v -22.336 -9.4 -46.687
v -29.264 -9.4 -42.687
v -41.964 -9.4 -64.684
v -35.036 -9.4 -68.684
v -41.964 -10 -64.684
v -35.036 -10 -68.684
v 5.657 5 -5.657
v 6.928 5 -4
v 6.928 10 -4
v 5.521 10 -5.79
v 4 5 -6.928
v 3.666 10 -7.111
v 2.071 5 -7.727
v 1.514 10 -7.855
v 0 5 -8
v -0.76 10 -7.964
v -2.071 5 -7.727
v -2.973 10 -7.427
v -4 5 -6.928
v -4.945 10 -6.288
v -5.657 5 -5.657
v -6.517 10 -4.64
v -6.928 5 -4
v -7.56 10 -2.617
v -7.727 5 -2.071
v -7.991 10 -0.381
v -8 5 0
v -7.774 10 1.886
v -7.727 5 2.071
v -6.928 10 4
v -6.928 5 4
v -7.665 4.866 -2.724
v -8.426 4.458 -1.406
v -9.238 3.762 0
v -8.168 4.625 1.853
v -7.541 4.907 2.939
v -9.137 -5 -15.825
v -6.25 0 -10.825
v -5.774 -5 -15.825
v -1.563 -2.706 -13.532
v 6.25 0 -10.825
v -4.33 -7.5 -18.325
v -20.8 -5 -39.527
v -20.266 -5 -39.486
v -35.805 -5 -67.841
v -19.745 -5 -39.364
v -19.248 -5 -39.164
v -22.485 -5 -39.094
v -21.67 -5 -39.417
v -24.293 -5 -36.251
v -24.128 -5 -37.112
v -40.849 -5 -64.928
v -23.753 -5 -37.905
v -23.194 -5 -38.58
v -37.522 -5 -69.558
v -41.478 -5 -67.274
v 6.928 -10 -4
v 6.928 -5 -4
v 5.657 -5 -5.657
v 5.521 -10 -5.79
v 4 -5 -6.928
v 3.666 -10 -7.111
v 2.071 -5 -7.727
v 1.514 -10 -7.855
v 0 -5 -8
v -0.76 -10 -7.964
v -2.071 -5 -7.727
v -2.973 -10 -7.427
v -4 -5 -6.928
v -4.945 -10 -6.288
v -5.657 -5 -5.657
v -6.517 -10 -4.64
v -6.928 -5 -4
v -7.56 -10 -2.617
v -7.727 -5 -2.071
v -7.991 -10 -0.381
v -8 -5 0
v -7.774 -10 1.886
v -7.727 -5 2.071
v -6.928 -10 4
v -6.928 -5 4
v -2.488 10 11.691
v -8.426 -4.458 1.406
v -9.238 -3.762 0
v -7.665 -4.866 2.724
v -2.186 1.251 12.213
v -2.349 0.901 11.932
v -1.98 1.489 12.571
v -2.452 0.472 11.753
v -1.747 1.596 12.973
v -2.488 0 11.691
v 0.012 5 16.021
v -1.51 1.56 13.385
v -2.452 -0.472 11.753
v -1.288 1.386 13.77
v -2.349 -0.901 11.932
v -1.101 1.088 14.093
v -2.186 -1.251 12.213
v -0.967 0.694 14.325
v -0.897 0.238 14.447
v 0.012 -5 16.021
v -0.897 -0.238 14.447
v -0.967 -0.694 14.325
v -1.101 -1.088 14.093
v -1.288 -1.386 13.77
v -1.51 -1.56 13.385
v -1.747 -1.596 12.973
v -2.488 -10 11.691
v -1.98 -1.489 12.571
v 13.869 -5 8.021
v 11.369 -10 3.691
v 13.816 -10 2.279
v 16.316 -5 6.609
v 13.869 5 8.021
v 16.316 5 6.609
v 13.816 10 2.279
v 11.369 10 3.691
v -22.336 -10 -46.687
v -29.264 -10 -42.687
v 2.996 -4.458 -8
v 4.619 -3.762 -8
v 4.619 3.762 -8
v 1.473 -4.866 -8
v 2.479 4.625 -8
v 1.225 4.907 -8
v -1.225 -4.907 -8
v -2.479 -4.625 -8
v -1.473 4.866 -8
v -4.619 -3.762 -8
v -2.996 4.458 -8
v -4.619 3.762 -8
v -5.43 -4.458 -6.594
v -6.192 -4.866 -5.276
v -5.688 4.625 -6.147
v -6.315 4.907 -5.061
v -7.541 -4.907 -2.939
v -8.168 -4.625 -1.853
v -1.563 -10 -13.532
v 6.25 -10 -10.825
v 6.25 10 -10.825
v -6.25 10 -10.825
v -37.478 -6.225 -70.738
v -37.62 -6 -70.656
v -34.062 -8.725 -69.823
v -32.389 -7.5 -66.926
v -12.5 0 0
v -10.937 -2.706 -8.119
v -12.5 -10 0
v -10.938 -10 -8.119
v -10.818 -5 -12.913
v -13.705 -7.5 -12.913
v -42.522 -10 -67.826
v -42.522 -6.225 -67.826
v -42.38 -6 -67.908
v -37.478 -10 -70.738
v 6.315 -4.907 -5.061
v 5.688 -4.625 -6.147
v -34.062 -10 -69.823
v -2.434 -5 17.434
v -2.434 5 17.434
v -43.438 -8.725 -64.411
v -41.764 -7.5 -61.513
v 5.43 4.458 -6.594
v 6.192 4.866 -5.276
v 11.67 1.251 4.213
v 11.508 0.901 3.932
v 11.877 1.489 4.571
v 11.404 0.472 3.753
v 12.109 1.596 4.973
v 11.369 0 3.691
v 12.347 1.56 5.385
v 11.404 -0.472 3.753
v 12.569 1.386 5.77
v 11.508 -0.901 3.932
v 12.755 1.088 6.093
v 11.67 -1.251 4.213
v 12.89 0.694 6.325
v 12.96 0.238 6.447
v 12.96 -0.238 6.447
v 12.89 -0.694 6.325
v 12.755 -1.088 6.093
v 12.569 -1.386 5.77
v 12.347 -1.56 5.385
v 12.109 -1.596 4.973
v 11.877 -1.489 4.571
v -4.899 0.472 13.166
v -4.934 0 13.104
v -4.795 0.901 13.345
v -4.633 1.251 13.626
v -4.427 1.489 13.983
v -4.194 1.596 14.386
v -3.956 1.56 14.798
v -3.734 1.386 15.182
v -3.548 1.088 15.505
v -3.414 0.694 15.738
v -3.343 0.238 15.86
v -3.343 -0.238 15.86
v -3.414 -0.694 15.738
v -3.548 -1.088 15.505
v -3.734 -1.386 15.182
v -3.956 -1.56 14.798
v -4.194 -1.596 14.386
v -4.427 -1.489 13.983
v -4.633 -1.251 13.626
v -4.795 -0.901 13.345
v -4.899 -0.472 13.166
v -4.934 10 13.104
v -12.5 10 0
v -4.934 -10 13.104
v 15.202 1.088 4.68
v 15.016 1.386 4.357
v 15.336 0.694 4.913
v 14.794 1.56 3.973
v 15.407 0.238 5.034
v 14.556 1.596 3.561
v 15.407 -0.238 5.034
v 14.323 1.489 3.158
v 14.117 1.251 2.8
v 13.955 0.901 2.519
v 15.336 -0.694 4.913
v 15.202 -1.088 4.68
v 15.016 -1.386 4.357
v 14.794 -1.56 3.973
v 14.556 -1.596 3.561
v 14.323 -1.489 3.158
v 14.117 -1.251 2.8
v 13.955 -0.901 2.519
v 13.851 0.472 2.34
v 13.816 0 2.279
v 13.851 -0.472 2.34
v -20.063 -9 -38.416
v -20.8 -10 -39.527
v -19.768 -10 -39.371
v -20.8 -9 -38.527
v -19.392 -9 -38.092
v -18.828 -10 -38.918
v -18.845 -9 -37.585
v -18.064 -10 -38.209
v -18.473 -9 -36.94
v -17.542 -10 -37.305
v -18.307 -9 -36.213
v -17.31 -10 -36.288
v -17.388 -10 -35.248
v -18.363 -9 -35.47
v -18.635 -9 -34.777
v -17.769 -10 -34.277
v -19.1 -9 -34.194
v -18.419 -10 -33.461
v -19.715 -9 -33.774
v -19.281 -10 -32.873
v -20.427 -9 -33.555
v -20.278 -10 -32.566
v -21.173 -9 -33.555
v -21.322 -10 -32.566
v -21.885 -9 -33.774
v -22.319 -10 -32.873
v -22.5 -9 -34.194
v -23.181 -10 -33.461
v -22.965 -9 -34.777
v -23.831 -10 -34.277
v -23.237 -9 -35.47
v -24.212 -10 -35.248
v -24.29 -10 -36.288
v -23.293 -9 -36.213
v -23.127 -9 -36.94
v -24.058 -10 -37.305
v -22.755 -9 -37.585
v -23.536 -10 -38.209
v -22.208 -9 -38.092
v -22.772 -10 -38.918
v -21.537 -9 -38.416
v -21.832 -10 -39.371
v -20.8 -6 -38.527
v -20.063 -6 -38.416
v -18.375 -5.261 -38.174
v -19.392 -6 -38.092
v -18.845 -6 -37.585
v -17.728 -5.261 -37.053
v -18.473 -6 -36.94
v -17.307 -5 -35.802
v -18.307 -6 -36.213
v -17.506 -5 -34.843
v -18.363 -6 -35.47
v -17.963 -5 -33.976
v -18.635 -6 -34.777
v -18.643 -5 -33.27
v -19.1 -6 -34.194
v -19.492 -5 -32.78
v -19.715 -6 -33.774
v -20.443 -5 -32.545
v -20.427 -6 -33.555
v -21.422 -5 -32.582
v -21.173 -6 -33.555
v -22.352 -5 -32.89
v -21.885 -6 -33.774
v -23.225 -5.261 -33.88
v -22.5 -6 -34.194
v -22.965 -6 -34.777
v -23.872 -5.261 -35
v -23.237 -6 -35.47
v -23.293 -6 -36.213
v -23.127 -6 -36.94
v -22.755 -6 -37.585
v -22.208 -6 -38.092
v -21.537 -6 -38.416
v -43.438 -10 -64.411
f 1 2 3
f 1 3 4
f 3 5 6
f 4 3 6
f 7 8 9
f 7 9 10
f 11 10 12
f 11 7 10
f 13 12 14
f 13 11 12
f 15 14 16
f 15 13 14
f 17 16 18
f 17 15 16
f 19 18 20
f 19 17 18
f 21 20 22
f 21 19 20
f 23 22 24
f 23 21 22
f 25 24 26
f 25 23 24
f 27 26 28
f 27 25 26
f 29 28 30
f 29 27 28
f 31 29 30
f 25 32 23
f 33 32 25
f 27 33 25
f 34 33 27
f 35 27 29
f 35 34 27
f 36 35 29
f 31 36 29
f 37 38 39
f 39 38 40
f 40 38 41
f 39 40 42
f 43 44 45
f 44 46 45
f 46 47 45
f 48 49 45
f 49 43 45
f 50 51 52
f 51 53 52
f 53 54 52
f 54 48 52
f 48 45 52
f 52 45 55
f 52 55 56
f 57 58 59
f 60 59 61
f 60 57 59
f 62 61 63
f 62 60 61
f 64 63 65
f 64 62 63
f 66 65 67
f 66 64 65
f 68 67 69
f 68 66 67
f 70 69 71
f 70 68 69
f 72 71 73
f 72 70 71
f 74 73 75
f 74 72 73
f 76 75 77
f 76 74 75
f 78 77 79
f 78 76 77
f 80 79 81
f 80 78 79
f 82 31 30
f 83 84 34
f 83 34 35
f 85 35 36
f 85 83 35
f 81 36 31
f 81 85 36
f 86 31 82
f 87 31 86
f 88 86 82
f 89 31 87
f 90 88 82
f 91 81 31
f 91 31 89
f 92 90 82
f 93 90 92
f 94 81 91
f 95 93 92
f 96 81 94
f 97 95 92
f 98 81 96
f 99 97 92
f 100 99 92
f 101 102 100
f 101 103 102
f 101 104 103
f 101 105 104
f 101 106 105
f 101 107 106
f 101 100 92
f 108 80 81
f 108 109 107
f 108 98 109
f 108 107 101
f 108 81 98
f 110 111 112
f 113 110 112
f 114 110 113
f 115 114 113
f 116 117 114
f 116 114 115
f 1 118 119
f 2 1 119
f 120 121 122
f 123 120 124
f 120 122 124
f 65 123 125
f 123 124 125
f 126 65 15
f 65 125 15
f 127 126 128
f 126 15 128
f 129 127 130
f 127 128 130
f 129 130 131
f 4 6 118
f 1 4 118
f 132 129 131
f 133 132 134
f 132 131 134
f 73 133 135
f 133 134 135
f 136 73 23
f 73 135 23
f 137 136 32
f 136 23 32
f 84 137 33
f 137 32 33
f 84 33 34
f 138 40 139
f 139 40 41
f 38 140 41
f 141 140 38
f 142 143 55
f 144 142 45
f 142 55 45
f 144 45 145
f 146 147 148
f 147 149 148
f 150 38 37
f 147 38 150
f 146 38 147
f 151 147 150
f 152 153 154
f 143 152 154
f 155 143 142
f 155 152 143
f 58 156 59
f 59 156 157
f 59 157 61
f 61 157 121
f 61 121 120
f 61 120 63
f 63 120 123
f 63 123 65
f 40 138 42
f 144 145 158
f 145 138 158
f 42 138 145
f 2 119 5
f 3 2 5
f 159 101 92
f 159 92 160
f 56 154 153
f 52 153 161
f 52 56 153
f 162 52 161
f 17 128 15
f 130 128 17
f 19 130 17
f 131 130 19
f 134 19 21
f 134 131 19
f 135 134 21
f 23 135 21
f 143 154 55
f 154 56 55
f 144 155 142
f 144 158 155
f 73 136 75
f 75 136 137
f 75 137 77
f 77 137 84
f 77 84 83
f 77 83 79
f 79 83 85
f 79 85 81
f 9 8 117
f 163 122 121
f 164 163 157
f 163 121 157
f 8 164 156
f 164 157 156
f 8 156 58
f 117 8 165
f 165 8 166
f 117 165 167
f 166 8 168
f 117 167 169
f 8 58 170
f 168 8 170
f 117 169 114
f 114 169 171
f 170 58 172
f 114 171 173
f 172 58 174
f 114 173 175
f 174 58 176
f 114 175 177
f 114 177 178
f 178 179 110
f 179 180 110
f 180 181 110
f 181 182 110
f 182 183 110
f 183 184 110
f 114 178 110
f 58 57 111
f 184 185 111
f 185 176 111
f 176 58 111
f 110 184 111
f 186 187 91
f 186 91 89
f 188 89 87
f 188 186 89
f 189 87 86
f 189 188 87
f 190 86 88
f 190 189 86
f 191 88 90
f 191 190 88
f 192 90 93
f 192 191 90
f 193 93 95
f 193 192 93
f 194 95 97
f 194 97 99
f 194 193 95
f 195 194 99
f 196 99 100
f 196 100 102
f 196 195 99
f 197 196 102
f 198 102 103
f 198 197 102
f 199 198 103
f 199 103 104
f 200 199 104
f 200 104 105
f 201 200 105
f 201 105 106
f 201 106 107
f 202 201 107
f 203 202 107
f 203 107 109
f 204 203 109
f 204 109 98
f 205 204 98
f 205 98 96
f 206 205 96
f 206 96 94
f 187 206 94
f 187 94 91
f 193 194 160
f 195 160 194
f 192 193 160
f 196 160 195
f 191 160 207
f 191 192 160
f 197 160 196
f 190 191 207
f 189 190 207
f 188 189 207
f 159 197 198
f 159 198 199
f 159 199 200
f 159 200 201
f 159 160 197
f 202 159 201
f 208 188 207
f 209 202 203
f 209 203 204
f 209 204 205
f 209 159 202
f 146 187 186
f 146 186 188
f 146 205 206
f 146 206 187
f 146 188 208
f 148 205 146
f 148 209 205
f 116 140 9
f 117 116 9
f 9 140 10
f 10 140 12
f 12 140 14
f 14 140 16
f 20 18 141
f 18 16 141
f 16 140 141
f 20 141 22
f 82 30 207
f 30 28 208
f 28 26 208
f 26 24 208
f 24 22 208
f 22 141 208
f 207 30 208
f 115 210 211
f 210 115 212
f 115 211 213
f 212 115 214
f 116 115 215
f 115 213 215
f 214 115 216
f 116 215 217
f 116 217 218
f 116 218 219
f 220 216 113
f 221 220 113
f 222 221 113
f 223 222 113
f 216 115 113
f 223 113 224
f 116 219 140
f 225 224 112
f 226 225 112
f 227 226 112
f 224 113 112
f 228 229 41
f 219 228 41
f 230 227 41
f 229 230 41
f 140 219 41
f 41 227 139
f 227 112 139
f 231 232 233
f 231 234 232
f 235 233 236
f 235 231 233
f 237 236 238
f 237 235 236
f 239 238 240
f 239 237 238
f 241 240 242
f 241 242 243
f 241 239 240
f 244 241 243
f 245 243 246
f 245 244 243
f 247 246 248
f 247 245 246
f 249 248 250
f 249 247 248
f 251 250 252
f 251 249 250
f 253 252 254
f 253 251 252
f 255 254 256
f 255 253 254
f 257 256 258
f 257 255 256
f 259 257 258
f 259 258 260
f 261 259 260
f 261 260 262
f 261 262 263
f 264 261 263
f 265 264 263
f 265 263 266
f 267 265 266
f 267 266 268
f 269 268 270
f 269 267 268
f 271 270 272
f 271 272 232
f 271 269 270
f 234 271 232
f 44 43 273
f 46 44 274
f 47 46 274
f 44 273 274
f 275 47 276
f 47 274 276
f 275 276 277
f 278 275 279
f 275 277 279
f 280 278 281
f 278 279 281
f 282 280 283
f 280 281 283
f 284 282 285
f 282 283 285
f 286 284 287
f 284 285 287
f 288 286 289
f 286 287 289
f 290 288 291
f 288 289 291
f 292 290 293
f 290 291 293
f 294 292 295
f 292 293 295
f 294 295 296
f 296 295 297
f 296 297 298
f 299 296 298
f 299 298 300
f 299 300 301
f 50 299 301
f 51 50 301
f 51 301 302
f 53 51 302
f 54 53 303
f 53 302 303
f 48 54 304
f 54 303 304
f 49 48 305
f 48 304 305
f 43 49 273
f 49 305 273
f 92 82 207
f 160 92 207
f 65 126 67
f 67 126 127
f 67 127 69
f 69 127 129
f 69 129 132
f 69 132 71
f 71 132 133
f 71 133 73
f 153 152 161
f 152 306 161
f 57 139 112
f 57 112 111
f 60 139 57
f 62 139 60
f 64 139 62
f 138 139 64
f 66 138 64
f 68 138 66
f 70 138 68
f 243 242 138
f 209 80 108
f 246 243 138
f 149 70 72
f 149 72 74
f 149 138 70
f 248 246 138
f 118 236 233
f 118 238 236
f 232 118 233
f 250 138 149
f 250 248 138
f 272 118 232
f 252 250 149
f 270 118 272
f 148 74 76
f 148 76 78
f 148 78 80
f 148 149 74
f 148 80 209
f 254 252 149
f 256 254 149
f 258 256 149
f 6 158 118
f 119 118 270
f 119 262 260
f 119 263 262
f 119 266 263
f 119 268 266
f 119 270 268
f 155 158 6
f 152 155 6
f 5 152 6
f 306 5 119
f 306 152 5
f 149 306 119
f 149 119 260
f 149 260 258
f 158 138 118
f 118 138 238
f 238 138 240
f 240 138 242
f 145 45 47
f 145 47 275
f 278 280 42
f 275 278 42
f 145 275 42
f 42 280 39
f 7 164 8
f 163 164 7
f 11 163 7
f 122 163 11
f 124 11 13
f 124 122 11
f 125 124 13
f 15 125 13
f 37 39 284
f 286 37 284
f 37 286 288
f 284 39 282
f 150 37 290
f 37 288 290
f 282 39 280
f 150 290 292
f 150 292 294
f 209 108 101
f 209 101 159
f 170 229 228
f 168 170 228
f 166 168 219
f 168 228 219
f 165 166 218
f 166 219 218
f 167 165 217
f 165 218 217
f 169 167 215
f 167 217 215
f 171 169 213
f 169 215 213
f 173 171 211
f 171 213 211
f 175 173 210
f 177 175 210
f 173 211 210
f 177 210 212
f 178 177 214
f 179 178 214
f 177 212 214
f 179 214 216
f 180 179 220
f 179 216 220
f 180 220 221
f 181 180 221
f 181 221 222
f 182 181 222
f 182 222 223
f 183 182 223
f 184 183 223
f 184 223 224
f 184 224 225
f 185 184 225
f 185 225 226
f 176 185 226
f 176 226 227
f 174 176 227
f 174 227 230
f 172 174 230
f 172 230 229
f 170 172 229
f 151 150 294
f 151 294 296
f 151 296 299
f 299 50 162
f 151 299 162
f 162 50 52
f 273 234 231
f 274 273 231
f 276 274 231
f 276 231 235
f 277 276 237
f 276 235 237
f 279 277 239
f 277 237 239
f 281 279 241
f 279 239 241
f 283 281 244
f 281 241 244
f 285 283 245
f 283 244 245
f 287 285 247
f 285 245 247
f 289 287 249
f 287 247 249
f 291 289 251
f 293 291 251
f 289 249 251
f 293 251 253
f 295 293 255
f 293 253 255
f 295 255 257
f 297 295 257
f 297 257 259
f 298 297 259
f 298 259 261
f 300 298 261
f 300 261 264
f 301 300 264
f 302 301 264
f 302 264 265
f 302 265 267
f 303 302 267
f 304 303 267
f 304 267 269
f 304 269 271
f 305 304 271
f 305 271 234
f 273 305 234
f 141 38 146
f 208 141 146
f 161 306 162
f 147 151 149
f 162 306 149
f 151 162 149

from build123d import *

# Parameters (mm, degrees)
SKETCH1_R                = 8
BOSS_EXTRUDE1_DEPTH      = 10
SKETCH1_3_R              = 8
CUT_EXTRUDE3_DEPTH       = 5
CUT_EXTRUDE6_DEPTH       = 20.324531042175384
CUT_EXTRUDE6_DEPTH_BACK  = 20.324531042175384
BOSS_EXTRUDE2_DEPTH      = 5
CHAMFER1_SIZE            = 5
CHAMFER2_SIZE            = 2.5
CHAMFER3_SIZE            = 2.5
CHAMFER4_SIZE            = 1
CHAMFER4_EDGE_2_SIZE     = 1
CHAMFER4_EDGE_2_SIZE2    = 2.7320508075695416
CHAMFER4_EDGE_3_SIZE     = 1
CHAMFER4_EDGE_3_SIZE2    = 2.7320508075682537
CUT_EXTRUDE7_DEPTH       = 0.6
SKETCH5_3_R              = 2.499999999999999
CUT_EXTRUDE8_DEPTH       = 86.3857846528101
CHAMFER5_SIZE            = 1
BOSS_EXTRUDE3_DEPTH      = 20
CHAMFER6_SIZE            = 5
CUT_EXTRUDE9_REACH       = 86.597
SKETCH7_R                = 1.6000000000000019
CHAMFER6_OF_MIRROR2_SIZE = 5


with BuildPart() as part:
    # Sketch1 → Boss-Extrude1 (new, symmetric)
    with BuildSketch(Plane(origin=(0, 0, 0), x_dir=(1, 0, 0), z_dir=(0, 1, 0))):
        Polygon((-12.5, 3.33e-15), (-6.249999999999997, -10.825317547305481), (6.249999999999998, -10.825317547305481), (12.499999999999995, 2.3e-15), (6.249999999999995, 10.825317547305485), (-6.249999999999999, 10.825317547305483), align=None)
        with Locations(Location((0, 0, 0), (0, 0, 270))):
            Circle(SKETCH1_R, mode=Mode.SUBTRACT)
    extrude(amount=BOSS_EXTRUDE1_DEPTH, both=True)

    # Sketch1<3> → Cut-Extrude3 (cut, symmetric)
    with BuildSketch(Plane(origin=(0, 0, 0), x_dir=(1, 0, 0), z_dir=(0, 1, 0))):
        with BuildLine():
            Line((9.237604307034013, 3.47e-15), (6.928203158180938, 4.000000124871458))
            ThreePointArc((6.928203158180937, 4.000000124871459), (7.727406591653098, 2.070552430458174), (8, 0))
            ThreePointArc((8, -1.96e-15), (7.727406617827326, -2.070552332774626), (6.92820325931039, -3.999999949710111))
            Line((6.92820325931039, -3.999999949710112), (9.237604307034013, 3.55e-15))
        make_face()
        with BuildLine():
            Line((6.928203158180938, 4.000000124871458), (4.6188021535170005, 7.999999999999998))
            Line((4.6188021535170005, 7.999999999999998), (-9.11633347e-09, 7.999999999999998))
            ThreePointArc((-9.11633386e-09, 8), (3.999999933616783, 6.9282032686018775), (6.928203158180937, 4.000000124871459))
        make_face()
        with BuildLine():
            ThreePointArc((-6.928203259310827, 3.9999999497093532), (-4.000000029092812, 6.928203213478766), (-9.11633386e-09, 8))
            Line((-9.11633347e-09, 7.999999999999998), (-4.618802153517008, 7.999999999999998))
            Line((-4.618802153517007, 7.999999999999998), (-6.928203259310829, 3.999999949709351))
        make_face()
        with BuildLine():
            ThreePointArc((-6.9282031729355795, -4.0000000993156695), (-7.999999999999999, -8.637524731e-08), (-6.928203259310827, 3.9999999497093532))
            Line((-6.928203259310829, 3.999999949709351), (-9.237604307034013, -1.78e-15))
            Line((-9.237604307034013, -1.73e-15), (-6.9282031729355795, -4.0000000993156695))
        make_face()
        with BuildLine():
            ThreePointArc((1.7617e-13, -8), (-3.9999999503420853, -6.928203258945519), (-6.9282031729355795, -4.0000000993156695))
            Line((-6.9282031729355795, -4.0000000993156695), (-4.6188021535170005, -8.000000000000002))
            Line((-4.6188021535170005, -8.000000000000002), (1.7586e-13, -8))
        make_face()
        with BuildLine():
            Line((4.6188021535170085, -7.999999999999998), (6.92820325931039, -3.999999949710112))
            ThreePointArc((6.92820325931039, -3.999999949710111), (4.000000025145024, -6.928203215758023), (1.7617e-13, -8))
            Line((1.7586e-13, -8), (4.618802153517008, -7.999999999999998))
        make_face()
        with Locations(Location((0, 0, 0), (0, 0, 270))):
            Circle(SKETCH1_3_R)
    extrude(amount=CUT_EXTRUDE3_DEPTH, both=True, mode=Mode.SUBTRACT)

    # Sketch2 → Revolve1 (revolve)
    with BuildSketch(Plane(origin=(0, 0, 0), x_dir=(0, 0, -1), z_dir=(1, 0, 0))):
        Polygon((9.239999999999998, 10), (8, 10), (8, 5.000000000000001), (9.24, 3.75999999999999), align=None)
    revolve1 = revolve(axis=Axis((0, 0, 0), (0, 1, 0)))

    # Mirror1: Revolve1 across plane
    add(revolve1.mirror(Plane.ZX))

    # Sketch3 → Cut-Extrude6 (cut, two sides: drawn at the far end of the back side and taken through both)
    with BuildSketch(Plane(origin=(0, 0, 0), x_dir=(1, 0, 0), z_dir=(0, 1, 0)).offset(-CUT_EXTRUDE6_DEPTH_BACK)):
        Polygon((-6.928203230275505, -4.0000000000000036), (6.928203230275509, 4), (13.370436636375942, -7.158275573583455), (-0.48596982417507123, -15.158275573583454), align=None)
    extrude(amount=CUT_EXTRUDE6_DEPTH + CUT_EXTRUDE6_DEPTH_BACK, mode=Mode.SUBTRACT)

    # Sketch4 → Boss-Extrude2 (add)
    with BuildSketch(Plane(origin=(0, -10, 0), x_dir=(-1, 0, 0), z_dir=(0, -1, 0))):
        Polygon((-6.249999999999994, 10.825317547305485), (3.55e-15, 10.825317547305483), (1.5625000000000036, 13.531646934131857), align=None)
        Polygon((1.5625000000000036, 13.531646934131857), (3.47e-15, 10.825317547305483), (6.249999999999999, 10.825317547305483), align=None)
        Polygon((35.31249999999998, 71.98836168958148), (1.5625000000000036, 13.531646934131857), (6.249999999999999, 10.825317547305485), (10.937499999999998, 8.11898816047911), (44.68750000000001, 66.57570291592872), align=None)
        Polygon((10.937499999999998, 8.11898816047911), (6.249999999999999, 10.825317547305485), (9.375, 5.412658773652744), align=None)
        Polygon((10.9375, 8.11898816047912), (9.375, 5.412658773652751), (12.500000000000002, 3.55e-15), align=None)
    extrude(amount=-BOSS_EXTRUDE2_DEPTH)

    # Chamfer1
    # the kernel refuses this chamfer: 5 mm, written as the material it adds along each edge
    with BuildSketch(Plane(origin=(19.108414939829547, -5, -10.825317547305485), x_dir=(0, 1, 3.6e-16), z_dir=(-1, 0, 0))) as chamfer1_piece_1_section:
        Polygon((CHAMFER1_SIZE, 0), (-1.78e-15, CHAMFER1_SIZE), (0, 0), align=None)
    chamfer1_piece_1 = extrude(amount=38.2168298796591, mode=Mode.PRIVATE)
    chamfer1_piece_1 = split(chamfer1_piece_1, bisect_by=Plane(origin=(0.08960373495738594, -5, -21.8058333161051), z_dir=(0.8660254037844386, 0, 0.5000000000000002)), keep=Keep.TOP, mode=Mode.PRIVATE)
    chamfer1_piece_1 = split(chamfer1_piece_1, bisect_by=Plane(origin=(4.777103734957368, -5, -2.551131165332242), z_dir=(-0.8660254037844389, 0, 0.49999999999999956)), keep=Keep.TOP, mode=Mode.PRIVATE)
    add(chamfer1_piece_1)
    with BuildSketch(Plane(origin=(19.108414939829547, -5, -10.825317547305485), x_dir=(0, 1, 3.6e-16), z_dir=(-1, 0, 0))) as chamfer1_piece_2_section:
        Polygon((CHAMFER1_SIZE, 0), (-1.78e-15, CHAMFER1_SIZE), (0, 0), align=None)
    chamfer1_piece_2 = extrude(amount=38.2168298796591, mode=Mode.PRIVATE)
    chamfer1_piece_2 = split(chamfer1_piece_2, bisect_by=Plane(origin=(17.730727624847805, -5, -6.848276836486285), z_dir=(-0.32732683535398893, 0, 0.9449111825230679)), keep=Keep.TOP, mode=Mode.PRIVATE)
    chamfer1_piece_2 = split(chamfer1_piece_2, bisect_by=Plane(origin=(4.777103734957372, -5, -2.5511311653322437), z_dir=(0.8660254037844389, 0, -0.49999999999999956)), keep=Keep.TOP, mode=Mode.PRIVATE)
    add(chamfer1_piece_2)
    with BuildSketch(Plane(origin=(19.108414939829547, -5, -10.825317547305485), x_dir=(0, 1, 3.6e-16), z_dir=(-1, 0, 0))) as chamfer1_piece_3_section:
        Polygon((CHAMFER1_SIZE, 0), (-1.78e-15, CHAMFER1_SIZE), (0, 0), align=None)
    chamfer1_piece_3 = extrude(amount=38.2168298796591, mode=Mode.PRIVATE)
    chamfer1_piece_3 = split(chamfer1_piece_3, bisect_by=Plane(origin=(17.730727624847805, -5, -6.848276836486285), z_dir=(0.32732683535398893, 0, -0.9449111825230679)), keep=Keep.TOP, mode=Mode.PRIVATE)
    chamfer1_piece_3 = split(chamfer1_piece_3, bisect_by=Plane(origin=(4.777103734957368, -5, -2.551131165332242), z_dir=(-0.8660254037844389, 0, 0.49999999999999956)), keep=Keep.TOP, mode=Mode.PRIVATE)
    add(chamfer1_piece_3)
    with BuildSketch(Plane(origin=(-18.929207469914783, -5, 11.135713990293745), x_dir=(1.5e-16, 1, 9e-17), z_dir=(0.5000000000000003, 0, -0.8660254037844386))) as chamfer1_piece_4_section:
        Polygon((CHAMFER1_SIZE, 0), (-8.9e-16, -CHAMFER1_SIZE), (0, 0), align=None)
    chamfer1_piece_4 = extrude(amount=38.216829879659116, mode=Mode.PRIVATE)
    chamfer1_piece_4 = split(chamfer1_piece_4, bisect_by=Plane(origin=(-18.929207469914786, -5, -10.825317547305481), z_dir=(1.4e-16, 0, 1)), keep=Keep.TOP, mode=Mode.PRIVATE)
    chamfer1_piece_4 = split(chamfer1_piece_4, bisect_by=Plane(origin=(-4.597896265042607, -5, 2.8615276083204897), z_dir=(0.8660254037844386, 0, -0.5000000000000002)), keep=Keep.TOP, mode=Mode.PRIVATE)
    add(chamfer1_piece_4)
    with BuildSketch(Plane(origin=(-18.929207469914783, -5, 11.135713990293745), x_dir=(1.5e-16, 1, 9e-17), z_dir=(0.5000000000000003, 0, -0.8660254037844386))) as chamfer1_piece_5_section:
        Polygon((CHAMFER1_SIZE, 0), (-8.9e-16, -CHAMFER1_SIZE), (0, 0), align=None)
    chamfer1_piece_5 = extrude(amount=38.216829879659116, mode=Mode.PRIVATE)
    chamfer1_piece_5 = split(chamfer1_piece_5, bisect_by=Plane(origin=(-14.796145524969571, -5, 11.931122132457586), z_dir=(0.9819805060619656, 0, 0.18898223650461415)), keep=Keep.TOP, mode=Mode.PRIVATE)
    chamfer1_piece_5 = split(chamfer1_piece_5, bisect_by=Plane(origin=(-4.597896265042607, -5, 2.8615276083204897), z_dir=(-0.8660254037844386, 0, 0.5000000000000002)), keep=Keep.TOP, mode=Mode.PRIVATE)
    add(chamfer1_piece_5)
    with BuildSketch(Plane(origin=(-18.929207469914783, -5, 11.135713990293745), x_dir=(1.5e-16, 1, 9e-17), z_dir=(0.5000000000000003, 0, -0.8660254037844386))) as chamfer1_piece_6_section:
        Polygon((CHAMFER1_SIZE, 0), (-8.9e-16, -CHAMFER1_SIZE), (0, 0), align=None)
    chamfer1_piece_6 = extrude(amount=38.216829879659116, mode=Mode.PRIVATE)
    chamfer1_piece_6 = split(chamfer1_piece_6, bisect_by=Plane(origin=(-14.796145524969573, -5, 11.931122132457585), z_dir=(-0.9819805060619656, 0, -0.18898223650461415)), keep=Keep.TOP, mode=Mode.PRIVATE)
    chamfer1_piece_6 = split(chamfer1_piece_6, bisect_by=Plane(origin=(-4.597896265042609, -5, 2.8615276083204915), z_dir=(0.8660254037844386, 0, -0.5000000000000002)), keep=Keep.TOP, mode=Mode.PRIVATE)
    add(chamfer1_piece_6)
    with BuildSketch(Plane(origin=(-18.929207469914783, -5, 11.135713990293745), x_dir=(1.5e-16, 1, 9e-17), z_dir=(0.5000000000000003, 0, -0.8660254037844386))) as chamfer1_piece_7a_section:
        Polygon((CHAMFER1_SIZE, 0), (-8.9e-16, -CHAMFER1_SIZE), (0, 0), align=None)
    chamfer1_piece_7a = extrude(amount=38.216829879659116, mode=Mode.PRIVATE)
    chamfer1_piece_7a = split(chamfer1_piece_7a, bisect_by=Plane(origin=(-14.796145524969571, -5, 11.931122132457586), z_dir=(0.9819805060619656, 0, 0.18898223650461415)), keep=Keep.TOP, mode=Mode.PRIVATE)
    chamfer1_piece_7a = split(chamfer1_piece_7a, bisect_by=Plane(origin=(-18.929207469914786, -5, -10.825317547305477), z_dir=(-1.4e-16, 0, -1)), keep=Keep.TOP, mode=Mode.PRIVATE)
    chamfer1_piece_7a = split(chamfer1_piece_7a, bisect_by=Plane(origin=(4.777103734957382, -5, -2.551131165332224), z_dir=(-0.8660254037844389, 0, 0.49999999999999956)), keep=Keep.TOP, mode=Mode.PRIVATE)
    with BuildSketch(Plane(origin=(19.108414939829547, -5, -10.825317547305485), x_dir=(0, 1, 3.6e-16), z_dir=(-1, 0, 0))) as chamfer1_piece_7b_section:
        Polygon((CHAMFER1_SIZE, 0), (-1.78e-15, CHAMFER1_SIZE), (0, 0), align=None)
    chamfer1_piece_7b = extrude(amount=38.2168298796591, mode=Mode.PRIVATE)
    chamfer1_piece_7b = split(chamfer1_piece_7b, bisect_by=Plane(origin=(0.08960373495739304, -5, -21.8058333161051), z_dir=(-0.8660254037844386, 0, -0.5000000000000002)), keep=Keep.TOP, mode=Mode.PRIVATE)
    chamfer1_piece_7b = split(chamfer1_piece_7b, bisect_by=Plane(origin=(-4.597896265042607, -5, 2.8615276083205003), z_dir=(0.8660254037844386, 0, -0.5000000000000002)), keep=Keep.TOP, mode=Mode.PRIVATE)
    chamfer1_piece_7b = split(chamfer1_piece_7b, bisect_by=Plane(origin=(17.730727624847805, -5, -6.848276836486287), z_dir=(-0.32732683535398893, 0, 0.9449111825230679)), keep=Keep.TOP, mode=Mode.PRIVATE)
    chamfer1_piece_7 = chamfer1_piece_7a & chamfer1_piece_7b
    add(chamfer1_piece_7)

    # Chamfer2
    chamfer2_edges = [part.edges().sort_by_distance(p)[0] for p in [
        (-28.47462567297219, -5, -38.49418084478748),
        (-19.09962567297447, -5, -43.906839618444195),
    ]]
    chamfer(chamfer2_edges, length=CHAMFER2_SIZE)

    # Chamfer3
    chamfer3_edges = [part.edges().sort_by_distance(p)[0] for p in [
        (-35.31249999999998, -8.75, -71.98836168958148),
        (-44.68750000000001, -8.75, -66.57570291592872),
    ]]
    chamfer(chamfer3_edges, length=CHAMFER3_SIZE)

    # Chamfer4
    chamfer4_edges = [part.edges().sort_by_distance(p)[0] for p in [
        (-40.00000000001547, -5, -69.28203230274616),
    ]]
    chamfer(chamfer4_edges, length=CHAMFER4_SIZE)

    # Chamfer4 edge 2
    chamfer4_edge_2_edges = [part.edges().sort_by_distance(p)[0] for p in [
        (-35.770031754746036, -6.24999999999993, -70.28082993484206),
    ]]
    chamfer4_edge_2_side = [part.faces().sort_by_distance(p)[0] for p in [
        (-35.959757505271654, -8.055555555555529, -70.33166679647876),
    ]]
    chamfer(chamfer4_edge_2_edges, length=CHAMFER4_EDGE_2_SIZE, length2=CHAMFER4_EDGE_2_SIZE2, reference=chamfer4_edge_2_side[0])

    # Chamfer4 edge 3
    chamfer4_edge_3_edges = [part.edges().sort_by_distance(p)[0] for p in [
        (-42.979968245284546, -6.250000000000065, -66.11817116118938),
    ]]
    chamfer4_edge_3_side = [part.faces().sort_by_distance(p)[0] for p in [
        (-42.929131383647835, -8.055555555555578, -66.30789691171502),
    ]]
    chamfer(chamfer4_edge_3_edges, length=CHAMFER4_EDGE_3_SIZE, length2=CHAMFER4_EDGE_3_SIZE2, reference=chamfer4_edge_3_side[0])

    # Sketch5 → Cut-Extrude7 (cut)
    with BuildSketch(Plane.XZ.offset(10)):
        Polygon((-22.33589838486227, -46.686910835277054), (-29.264101615137765, -42.68691083527706), (-41.96410161513777, -64.6839560914018), (-35.03589838486225, -68.68395609140181), align=None)
    extrude(amount=-CUT_EXTRUDE7_DEPTH, mode=Mode.SUBTRACT)

    # Sketch5<3> → Cut-Extrude8 (cut, through all)
    with BuildSketch(Plane.XZ.offset(10)):
        with Locations(Location((-20.800000000000015, -36.026656797432665, 0), (0, 0, 270))):
            Circle(SKETCH5_3_R)
    extrude(amount=-CUT_EXTRUDE8_DEPTH, mode=Mode.SUBTRACT)

    # Chamfer5
    # the kernel refuses this chamfer: 1 mm, written as the material it takes off along each edge
    with BuildSketch(Plane(origin=(-20.800000000000015, -5, -36.026656797432665), x_dir=(0, 0, -1), z_dir=(-1, 0, 0))) as chamfer5_piece_1:
        Polygon((2.5 + CHAMFER5_SIZE, 0), (2.5, CHAMFER5_SIZE), (2.5, 0), align=None)
    revolve(axis=Axis((-20.800000000000015, -5, -36.026656797432665), (0, -1, 0)), mode=Mode.SUBTRACT)
    with BuildSketch(Plane(origin=(-20.800000000000015, -10, -36.026656797432665), x_dir=(0, 0, -1), z_dir=(-1, 0, 0))) as chamfer5_piece_2:
        Polygon((2.5 + CHAMFER5_SIZE, 0), (2.5, -CHAMFER5_SIZE), (2.5, 0), align=None)
    revolve(axis=Axis((-20.800000000000015, -10, -36.026656797432665), (0, -1, 0)), mode=Mode.SUBTRACT)

    # Sketch6 → Boss-Extrude3 (add)
    with BuildSketch(Plane(origin=(0, -10, 0), x_dir=(-1, 0, 0), z_dir=(0, -1, 0))):
        Polygon((-10.868802153517006, -2.8253175473054815), (-13.868802153517004, -8.021469970012113), (-16.315598923241495, -6.608811196359374), (-12.499999999999995, 1.73e-15), align=None)
    boss_extrude3 = extrude(amount=-BOSS_EXTRUDE3_DEPTH)

    # Chamfer6
    chamfer6_edges = [part.edges().sort_by_distance(p)[0] for p in [
        (15.092200538379249, -10, 7.315140583185744),
        (15.092200538379249, 10, 7.315140583185744),
    ]]
    chamfer(chamfer6_edges, length=CHAMFER6_SIZE)

    # Sketch7 → Cut-Extrude9 (cut, up to next)
    with BuildSketch(Plane(origin=(9.374999999999996, 0, -5.4126587736527405), x_dir=(-0.5000000000000001, 0, -0.8660254037844386), z_dir=(0.8660254037844386, 0, -0.5000000000000001)), mode=Mode.PRIVATE) as cut_extrude9_sk1:
        with Locations((-10.481197846482983, 0)):
            Circle(SKETCH7_R)
    cut_extrude9_tool1 = extrude(cut_extrude9_sk1.sketch, amount=-CUT_EXTRUDE9_REACH, mode=Mode.PRIVATE) & part.part
    cut_extrude9 = cut_extrude9_tool1.solids().sort_by_distance((14.615599, 0, 3.664325))[0]
    add(cut_extrude9, mode=Mode.SUBTRACT)

    # Mirror2: Boss-Extrude3, Cut-Extrude9 across plane
    add(boss_extrude3.mirror(Plane(origin=(0, 0, 0), x_dir=(0.5000000000000001, 0, 0.8660254037844386), z_dir=(0.8660254037844386, 0, -0.5000000000000001))))
    add(cut_extrude9.mirror(Plane(origin=(0, 0, 0), x_dir=(0.5000000000000001, 0, 0.8660254037844386), z_dir=(0.8660254037844386, 0, -0.5000000000000001))), mode=Mode.SUBTRACT)

    # Chamfer6 of Mirror2
    chamfer6_of_mirror2_edges = [part.edges().sort_by_distance(p)[0] for p in [
        (-1.211002691896252, -10, 16.727799356838485),
        (-1.211002691896252, 10, 16.727799356838485),
    ]]
    chamfer(chamfer6_of_mirror2_edges, length=CHAMFER6_OF_MIRROR2_SIZE)


solid = part.part
